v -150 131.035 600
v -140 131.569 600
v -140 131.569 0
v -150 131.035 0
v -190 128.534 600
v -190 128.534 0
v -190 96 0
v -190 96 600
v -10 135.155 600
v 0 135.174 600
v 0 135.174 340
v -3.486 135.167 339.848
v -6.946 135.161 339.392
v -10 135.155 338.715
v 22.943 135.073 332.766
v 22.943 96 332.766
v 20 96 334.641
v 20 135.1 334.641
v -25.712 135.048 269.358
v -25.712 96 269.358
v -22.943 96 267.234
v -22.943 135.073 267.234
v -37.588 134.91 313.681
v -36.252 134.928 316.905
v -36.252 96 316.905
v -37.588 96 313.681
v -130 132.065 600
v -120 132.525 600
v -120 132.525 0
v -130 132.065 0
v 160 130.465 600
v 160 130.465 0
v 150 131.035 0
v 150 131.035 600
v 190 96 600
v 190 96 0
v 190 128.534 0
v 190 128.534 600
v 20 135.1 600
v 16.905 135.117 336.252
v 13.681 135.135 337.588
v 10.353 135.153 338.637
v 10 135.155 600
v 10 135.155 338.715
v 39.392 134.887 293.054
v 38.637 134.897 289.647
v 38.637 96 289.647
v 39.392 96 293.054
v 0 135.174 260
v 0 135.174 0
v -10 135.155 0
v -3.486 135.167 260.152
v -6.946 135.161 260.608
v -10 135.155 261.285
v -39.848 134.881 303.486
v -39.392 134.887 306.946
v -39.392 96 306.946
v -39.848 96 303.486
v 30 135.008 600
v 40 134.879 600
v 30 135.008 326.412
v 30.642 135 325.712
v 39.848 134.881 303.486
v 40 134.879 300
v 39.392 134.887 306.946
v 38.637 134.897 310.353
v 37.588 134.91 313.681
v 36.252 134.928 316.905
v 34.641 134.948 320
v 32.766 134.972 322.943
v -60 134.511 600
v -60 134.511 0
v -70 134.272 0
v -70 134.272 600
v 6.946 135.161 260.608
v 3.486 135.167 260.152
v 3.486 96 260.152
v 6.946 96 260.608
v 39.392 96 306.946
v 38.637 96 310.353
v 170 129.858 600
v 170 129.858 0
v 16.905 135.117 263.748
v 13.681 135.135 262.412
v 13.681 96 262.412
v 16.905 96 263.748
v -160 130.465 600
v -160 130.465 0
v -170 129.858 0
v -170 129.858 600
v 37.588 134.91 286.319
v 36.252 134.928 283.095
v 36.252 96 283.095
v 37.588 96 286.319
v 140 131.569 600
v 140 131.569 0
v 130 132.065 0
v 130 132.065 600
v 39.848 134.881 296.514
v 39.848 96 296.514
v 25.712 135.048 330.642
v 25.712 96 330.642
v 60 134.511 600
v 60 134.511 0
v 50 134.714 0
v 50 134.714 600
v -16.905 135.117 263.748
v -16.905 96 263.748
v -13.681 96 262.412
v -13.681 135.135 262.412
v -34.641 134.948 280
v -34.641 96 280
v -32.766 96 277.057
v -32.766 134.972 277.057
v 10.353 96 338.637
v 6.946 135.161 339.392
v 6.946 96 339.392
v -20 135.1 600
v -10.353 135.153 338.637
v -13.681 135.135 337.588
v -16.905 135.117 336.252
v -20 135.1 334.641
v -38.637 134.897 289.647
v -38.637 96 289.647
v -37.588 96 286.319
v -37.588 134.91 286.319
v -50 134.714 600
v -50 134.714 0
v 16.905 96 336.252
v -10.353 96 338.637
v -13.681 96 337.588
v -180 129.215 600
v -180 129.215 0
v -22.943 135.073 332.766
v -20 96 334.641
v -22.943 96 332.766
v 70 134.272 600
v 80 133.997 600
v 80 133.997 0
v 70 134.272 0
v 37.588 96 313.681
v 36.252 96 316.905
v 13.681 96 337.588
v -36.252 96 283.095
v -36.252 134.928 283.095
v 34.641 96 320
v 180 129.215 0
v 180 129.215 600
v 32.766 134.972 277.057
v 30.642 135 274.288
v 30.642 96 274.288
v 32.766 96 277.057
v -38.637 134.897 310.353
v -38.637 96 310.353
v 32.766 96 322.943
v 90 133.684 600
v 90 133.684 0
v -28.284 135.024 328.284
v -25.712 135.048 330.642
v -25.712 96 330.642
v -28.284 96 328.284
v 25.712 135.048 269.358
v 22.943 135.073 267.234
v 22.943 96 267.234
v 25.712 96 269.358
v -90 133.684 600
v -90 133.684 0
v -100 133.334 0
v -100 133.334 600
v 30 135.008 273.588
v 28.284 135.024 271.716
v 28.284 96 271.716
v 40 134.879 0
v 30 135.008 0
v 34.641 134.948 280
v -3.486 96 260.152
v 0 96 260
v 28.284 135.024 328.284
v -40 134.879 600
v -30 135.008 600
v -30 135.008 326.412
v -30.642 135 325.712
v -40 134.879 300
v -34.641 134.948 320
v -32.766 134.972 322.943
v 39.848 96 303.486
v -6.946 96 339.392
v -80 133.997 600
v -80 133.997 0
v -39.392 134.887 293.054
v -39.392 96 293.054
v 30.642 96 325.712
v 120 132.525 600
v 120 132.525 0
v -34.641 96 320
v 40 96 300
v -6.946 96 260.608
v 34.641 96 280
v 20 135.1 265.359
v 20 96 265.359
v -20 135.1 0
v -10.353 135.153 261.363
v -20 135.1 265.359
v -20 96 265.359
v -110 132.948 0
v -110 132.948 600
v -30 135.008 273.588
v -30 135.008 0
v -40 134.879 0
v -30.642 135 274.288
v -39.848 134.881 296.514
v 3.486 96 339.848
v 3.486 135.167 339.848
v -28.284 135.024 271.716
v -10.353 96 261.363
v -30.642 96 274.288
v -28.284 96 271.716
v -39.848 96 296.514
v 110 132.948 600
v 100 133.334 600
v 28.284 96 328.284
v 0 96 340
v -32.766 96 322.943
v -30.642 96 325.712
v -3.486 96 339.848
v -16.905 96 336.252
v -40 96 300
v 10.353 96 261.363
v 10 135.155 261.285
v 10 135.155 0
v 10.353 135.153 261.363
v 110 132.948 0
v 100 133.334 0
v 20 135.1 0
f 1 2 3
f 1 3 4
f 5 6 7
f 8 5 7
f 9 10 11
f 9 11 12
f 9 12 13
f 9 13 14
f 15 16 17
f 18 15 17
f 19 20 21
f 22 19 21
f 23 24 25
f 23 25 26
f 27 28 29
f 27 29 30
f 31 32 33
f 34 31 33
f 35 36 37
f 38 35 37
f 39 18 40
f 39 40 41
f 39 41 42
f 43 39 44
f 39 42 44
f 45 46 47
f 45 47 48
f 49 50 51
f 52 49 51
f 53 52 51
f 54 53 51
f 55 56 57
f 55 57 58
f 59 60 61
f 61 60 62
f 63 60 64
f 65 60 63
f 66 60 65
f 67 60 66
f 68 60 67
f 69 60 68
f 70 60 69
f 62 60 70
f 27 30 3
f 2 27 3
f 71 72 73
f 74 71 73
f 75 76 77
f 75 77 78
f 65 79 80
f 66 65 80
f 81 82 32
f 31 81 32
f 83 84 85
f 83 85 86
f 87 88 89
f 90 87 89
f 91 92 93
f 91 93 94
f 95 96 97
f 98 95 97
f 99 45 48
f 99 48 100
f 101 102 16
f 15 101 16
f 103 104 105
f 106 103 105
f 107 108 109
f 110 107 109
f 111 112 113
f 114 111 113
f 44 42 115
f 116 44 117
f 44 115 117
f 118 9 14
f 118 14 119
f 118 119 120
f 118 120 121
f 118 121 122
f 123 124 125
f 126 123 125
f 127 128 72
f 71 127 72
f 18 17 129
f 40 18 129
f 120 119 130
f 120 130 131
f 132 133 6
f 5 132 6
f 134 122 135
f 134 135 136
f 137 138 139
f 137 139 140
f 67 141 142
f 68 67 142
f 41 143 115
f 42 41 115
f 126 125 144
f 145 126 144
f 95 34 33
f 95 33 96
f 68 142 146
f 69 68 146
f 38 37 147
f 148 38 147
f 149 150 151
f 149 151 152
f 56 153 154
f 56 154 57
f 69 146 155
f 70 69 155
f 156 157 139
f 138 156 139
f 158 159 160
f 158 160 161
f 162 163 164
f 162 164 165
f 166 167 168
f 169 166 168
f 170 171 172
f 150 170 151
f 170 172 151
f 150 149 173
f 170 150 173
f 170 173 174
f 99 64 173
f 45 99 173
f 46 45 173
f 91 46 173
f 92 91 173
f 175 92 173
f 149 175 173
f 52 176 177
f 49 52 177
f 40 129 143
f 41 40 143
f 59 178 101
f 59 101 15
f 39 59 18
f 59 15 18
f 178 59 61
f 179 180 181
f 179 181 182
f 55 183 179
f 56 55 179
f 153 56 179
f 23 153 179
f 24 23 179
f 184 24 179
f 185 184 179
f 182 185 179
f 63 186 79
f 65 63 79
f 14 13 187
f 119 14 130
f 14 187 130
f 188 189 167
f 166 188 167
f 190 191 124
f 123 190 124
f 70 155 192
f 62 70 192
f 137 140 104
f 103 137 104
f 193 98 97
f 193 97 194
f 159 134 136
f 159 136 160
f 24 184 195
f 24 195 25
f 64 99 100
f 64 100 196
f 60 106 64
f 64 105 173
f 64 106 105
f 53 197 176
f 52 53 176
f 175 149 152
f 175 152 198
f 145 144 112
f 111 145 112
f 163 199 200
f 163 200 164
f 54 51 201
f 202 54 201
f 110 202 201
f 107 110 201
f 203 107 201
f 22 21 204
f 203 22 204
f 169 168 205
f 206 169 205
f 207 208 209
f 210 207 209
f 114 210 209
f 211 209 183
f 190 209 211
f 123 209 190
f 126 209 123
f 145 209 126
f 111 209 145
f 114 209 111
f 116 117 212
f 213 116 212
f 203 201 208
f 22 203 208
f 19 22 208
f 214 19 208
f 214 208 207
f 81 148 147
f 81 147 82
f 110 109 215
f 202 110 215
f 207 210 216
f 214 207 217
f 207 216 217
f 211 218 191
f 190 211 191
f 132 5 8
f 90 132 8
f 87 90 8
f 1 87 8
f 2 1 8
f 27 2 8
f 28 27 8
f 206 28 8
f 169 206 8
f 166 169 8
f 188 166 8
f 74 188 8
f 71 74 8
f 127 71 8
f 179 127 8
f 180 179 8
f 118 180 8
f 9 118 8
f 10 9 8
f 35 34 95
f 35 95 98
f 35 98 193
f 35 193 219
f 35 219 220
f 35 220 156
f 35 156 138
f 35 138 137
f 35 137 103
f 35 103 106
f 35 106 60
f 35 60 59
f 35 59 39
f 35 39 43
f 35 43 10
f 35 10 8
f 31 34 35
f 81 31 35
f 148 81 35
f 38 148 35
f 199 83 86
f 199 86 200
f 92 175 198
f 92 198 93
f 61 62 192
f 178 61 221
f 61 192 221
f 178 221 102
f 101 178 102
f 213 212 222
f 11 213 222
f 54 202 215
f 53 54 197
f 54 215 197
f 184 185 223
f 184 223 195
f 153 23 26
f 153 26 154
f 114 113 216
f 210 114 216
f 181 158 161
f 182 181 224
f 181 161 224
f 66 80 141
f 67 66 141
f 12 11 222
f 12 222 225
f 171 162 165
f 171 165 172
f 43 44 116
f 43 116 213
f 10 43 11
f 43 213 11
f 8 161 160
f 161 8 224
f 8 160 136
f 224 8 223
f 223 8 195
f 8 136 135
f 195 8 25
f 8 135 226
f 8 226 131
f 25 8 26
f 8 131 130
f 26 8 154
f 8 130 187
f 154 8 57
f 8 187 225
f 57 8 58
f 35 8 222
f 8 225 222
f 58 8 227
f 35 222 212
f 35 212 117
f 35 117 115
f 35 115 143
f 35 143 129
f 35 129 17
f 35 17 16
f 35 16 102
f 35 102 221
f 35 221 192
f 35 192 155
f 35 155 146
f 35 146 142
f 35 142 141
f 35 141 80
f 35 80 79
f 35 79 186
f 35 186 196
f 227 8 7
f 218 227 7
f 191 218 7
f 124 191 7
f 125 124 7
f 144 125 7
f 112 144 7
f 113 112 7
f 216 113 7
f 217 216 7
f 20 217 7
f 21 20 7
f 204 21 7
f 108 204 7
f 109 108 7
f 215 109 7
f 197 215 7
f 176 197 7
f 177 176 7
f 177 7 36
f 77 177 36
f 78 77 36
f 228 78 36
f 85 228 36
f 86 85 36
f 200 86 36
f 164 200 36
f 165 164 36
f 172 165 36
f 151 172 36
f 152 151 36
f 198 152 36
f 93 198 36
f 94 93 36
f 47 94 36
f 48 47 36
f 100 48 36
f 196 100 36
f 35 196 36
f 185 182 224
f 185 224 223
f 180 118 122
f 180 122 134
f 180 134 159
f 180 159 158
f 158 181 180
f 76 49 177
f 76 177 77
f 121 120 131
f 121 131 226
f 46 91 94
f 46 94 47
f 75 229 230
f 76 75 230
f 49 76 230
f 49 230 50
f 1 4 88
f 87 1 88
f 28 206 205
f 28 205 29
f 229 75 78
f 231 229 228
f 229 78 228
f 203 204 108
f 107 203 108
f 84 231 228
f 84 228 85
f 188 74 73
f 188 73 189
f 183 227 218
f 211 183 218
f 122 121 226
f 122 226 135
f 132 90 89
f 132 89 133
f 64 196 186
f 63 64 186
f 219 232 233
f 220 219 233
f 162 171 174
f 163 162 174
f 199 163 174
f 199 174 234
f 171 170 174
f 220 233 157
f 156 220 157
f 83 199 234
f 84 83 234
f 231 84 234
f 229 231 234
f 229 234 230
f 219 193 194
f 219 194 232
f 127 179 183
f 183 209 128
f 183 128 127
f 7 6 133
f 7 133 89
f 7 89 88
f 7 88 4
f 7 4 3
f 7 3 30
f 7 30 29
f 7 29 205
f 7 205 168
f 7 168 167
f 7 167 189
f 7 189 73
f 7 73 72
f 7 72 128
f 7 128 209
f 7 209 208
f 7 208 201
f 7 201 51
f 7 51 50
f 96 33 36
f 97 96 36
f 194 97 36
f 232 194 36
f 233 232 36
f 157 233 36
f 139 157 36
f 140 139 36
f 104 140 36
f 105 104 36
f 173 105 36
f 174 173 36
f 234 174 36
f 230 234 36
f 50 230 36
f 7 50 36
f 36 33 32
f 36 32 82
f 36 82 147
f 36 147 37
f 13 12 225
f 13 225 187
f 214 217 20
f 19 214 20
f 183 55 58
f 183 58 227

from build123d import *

# Parameters (mm, degrees)
ARCHED_FLOAT_DEPTH             = 600
TETHER_PASS_THROUGH_DEPTH      = 644.717254264
TETHER_PASS_THROUGH_DEPTH_BACK = 644.717254264


with BuildPart() as part:
    # 草图1 → Arched_float (new body)
    with BuildSketch(Plane.XY):
        Polygon((-190, 96), (190, 96), (190, 128.534010774), (180, 129.214523018), (170, 129.858251246), (160, 130.465194796), (150, 131.035353667), (140, 131.568728191), (130, 132.065318368), (120, 132.525124198), (110, 132.948145349), (100, 133.334382153), (90, 133.683834279), (80, 133.996502389), (70, 134.272385821), (60, 134.511484574), (50, 134.71379898), (40, 134.879329039), (30, 135.008074751), (20, 135.100035784), (10, 135.15521247), (0, 135.17360481), (-10, 135.15521247), (-20, 135.100035784), (-30, 135.008074751), (-40, 134.879329039), (-50, 134.71379898), (-60, 134.511484574), (-70, 134.272385821), (-80, 133.996502389), (-90, 133.683834279), (-100, 133.334382153), (-110, 132.948145349), (-120, 132.525124198), (-130, 132.065318368), (-140, 131.568728191), (-150, 131.035353667), (-160, 130.465194796), (-170, 129.858251246), (-180, 129.214523018), (-190, 128.534010774), align=None)
    extrude(amount=ARCHED_FLOAT_DEPTH)

    # 草图2 → Tether_pass_through (cut, two sides: drawn at the far end of the back side and taken through both)
    with BuildSketch(Plane(origin=(0, 0, 0), x_dir=(1, 0, 0), z_dir=(0, 1, 0)).offset(-TETHER_PASS_THROUGH_DEPTH_BACK)):
        Polygon((40, -300), (39.847787924, -303.48622971), (39.39231012, -306.945927107), (38.637033052, -310.352761804), (37.587704831, -313.680805733), (36.252311481, -316.90473047), (34.641016151, -320), (32.766081772, -322.943057454), (30.641777725, -325.711504387), (28.284271247, -328.284271247), (25.711504387, -330.641777725), (22.943057454, -332.766081772), (20, -334.641016151), (16.90473047, -336.252311481), (13.680805733, -337.587704831), (10.352761804, -338.637033052), (6.945927107, -339.39231012), (3.48622971, -339.847787924), (0, -340), (-3.48622971, -339.847787924), (-6.945927107, -339.39231012), (-10.352761804, -338.637033052), (-13.680805733, -337.587704831), (-16.90473047, -336.252311481), (-20, -334.641016151), (-22.943057454, -332.766081772), (-25.711504387, -330.641777725), (-28.284271247, -328.284271247), (-30.641777725, -325.711504387), (-32.766081772, -322.943057454), (-34.641016151, -320), (-36.252311481, -316.90473047), (-37.587704831, -313.680805733), (-38.637033052, -310.352761804), (-39.39231012, -306.945927107), (-39.847787924, -303.48622971), (-40, -300), (-39.847787924, -296.51377029), (-39.39231012, -293.054072893), (-38.637033052, -289.647238196), (-37.587704831, -286.319194267), (-36.252311481, -283.09526953), (-34.641016151, -280), (-32.766081772, -277.056942546), (-30.641777725, -274.288495613), (-28.284271247, -271.715728753), (-25.711504387, -269.358222275), (-22.943057454, -267.233918228), (-20, -265.358983849), (-16.90473047, -263.747688519), (-13.680805733, -262.412295169), (-10.352761804, -261.362966948), (-6.945927107, -260.60768988), (-3.48622971, -260.152212076), (0, -260), (3.48622971, -260.152212076), (6.945927107, -260.60768988), (10.352761804, -261.362966948), (13.680805733, -262.412295169), (16.90473047, -263.747688519), (20, -265.358983849), (22.943057454, -267.233918228), (25.711504387, -269.358222275), (28.284271247, -271.715728753), (30.641777725, -274.288495613), (32.766081772, -277.056942546), (34.641016151, -280), (36.252311481, -283.09526953), (37.587704831, -286.319194267), (38.637033052, -289.647238196), (39.39231012, -293.054072893), (39.847787924, -296.51377029), align=None)
    extrude(amount=TETHER_PASS_THROUGH_DEPTH + TETHER_PASS_THROUGH_DEPTH_BACK, mode=Mode.SUBTRACT)


solid = part.part
